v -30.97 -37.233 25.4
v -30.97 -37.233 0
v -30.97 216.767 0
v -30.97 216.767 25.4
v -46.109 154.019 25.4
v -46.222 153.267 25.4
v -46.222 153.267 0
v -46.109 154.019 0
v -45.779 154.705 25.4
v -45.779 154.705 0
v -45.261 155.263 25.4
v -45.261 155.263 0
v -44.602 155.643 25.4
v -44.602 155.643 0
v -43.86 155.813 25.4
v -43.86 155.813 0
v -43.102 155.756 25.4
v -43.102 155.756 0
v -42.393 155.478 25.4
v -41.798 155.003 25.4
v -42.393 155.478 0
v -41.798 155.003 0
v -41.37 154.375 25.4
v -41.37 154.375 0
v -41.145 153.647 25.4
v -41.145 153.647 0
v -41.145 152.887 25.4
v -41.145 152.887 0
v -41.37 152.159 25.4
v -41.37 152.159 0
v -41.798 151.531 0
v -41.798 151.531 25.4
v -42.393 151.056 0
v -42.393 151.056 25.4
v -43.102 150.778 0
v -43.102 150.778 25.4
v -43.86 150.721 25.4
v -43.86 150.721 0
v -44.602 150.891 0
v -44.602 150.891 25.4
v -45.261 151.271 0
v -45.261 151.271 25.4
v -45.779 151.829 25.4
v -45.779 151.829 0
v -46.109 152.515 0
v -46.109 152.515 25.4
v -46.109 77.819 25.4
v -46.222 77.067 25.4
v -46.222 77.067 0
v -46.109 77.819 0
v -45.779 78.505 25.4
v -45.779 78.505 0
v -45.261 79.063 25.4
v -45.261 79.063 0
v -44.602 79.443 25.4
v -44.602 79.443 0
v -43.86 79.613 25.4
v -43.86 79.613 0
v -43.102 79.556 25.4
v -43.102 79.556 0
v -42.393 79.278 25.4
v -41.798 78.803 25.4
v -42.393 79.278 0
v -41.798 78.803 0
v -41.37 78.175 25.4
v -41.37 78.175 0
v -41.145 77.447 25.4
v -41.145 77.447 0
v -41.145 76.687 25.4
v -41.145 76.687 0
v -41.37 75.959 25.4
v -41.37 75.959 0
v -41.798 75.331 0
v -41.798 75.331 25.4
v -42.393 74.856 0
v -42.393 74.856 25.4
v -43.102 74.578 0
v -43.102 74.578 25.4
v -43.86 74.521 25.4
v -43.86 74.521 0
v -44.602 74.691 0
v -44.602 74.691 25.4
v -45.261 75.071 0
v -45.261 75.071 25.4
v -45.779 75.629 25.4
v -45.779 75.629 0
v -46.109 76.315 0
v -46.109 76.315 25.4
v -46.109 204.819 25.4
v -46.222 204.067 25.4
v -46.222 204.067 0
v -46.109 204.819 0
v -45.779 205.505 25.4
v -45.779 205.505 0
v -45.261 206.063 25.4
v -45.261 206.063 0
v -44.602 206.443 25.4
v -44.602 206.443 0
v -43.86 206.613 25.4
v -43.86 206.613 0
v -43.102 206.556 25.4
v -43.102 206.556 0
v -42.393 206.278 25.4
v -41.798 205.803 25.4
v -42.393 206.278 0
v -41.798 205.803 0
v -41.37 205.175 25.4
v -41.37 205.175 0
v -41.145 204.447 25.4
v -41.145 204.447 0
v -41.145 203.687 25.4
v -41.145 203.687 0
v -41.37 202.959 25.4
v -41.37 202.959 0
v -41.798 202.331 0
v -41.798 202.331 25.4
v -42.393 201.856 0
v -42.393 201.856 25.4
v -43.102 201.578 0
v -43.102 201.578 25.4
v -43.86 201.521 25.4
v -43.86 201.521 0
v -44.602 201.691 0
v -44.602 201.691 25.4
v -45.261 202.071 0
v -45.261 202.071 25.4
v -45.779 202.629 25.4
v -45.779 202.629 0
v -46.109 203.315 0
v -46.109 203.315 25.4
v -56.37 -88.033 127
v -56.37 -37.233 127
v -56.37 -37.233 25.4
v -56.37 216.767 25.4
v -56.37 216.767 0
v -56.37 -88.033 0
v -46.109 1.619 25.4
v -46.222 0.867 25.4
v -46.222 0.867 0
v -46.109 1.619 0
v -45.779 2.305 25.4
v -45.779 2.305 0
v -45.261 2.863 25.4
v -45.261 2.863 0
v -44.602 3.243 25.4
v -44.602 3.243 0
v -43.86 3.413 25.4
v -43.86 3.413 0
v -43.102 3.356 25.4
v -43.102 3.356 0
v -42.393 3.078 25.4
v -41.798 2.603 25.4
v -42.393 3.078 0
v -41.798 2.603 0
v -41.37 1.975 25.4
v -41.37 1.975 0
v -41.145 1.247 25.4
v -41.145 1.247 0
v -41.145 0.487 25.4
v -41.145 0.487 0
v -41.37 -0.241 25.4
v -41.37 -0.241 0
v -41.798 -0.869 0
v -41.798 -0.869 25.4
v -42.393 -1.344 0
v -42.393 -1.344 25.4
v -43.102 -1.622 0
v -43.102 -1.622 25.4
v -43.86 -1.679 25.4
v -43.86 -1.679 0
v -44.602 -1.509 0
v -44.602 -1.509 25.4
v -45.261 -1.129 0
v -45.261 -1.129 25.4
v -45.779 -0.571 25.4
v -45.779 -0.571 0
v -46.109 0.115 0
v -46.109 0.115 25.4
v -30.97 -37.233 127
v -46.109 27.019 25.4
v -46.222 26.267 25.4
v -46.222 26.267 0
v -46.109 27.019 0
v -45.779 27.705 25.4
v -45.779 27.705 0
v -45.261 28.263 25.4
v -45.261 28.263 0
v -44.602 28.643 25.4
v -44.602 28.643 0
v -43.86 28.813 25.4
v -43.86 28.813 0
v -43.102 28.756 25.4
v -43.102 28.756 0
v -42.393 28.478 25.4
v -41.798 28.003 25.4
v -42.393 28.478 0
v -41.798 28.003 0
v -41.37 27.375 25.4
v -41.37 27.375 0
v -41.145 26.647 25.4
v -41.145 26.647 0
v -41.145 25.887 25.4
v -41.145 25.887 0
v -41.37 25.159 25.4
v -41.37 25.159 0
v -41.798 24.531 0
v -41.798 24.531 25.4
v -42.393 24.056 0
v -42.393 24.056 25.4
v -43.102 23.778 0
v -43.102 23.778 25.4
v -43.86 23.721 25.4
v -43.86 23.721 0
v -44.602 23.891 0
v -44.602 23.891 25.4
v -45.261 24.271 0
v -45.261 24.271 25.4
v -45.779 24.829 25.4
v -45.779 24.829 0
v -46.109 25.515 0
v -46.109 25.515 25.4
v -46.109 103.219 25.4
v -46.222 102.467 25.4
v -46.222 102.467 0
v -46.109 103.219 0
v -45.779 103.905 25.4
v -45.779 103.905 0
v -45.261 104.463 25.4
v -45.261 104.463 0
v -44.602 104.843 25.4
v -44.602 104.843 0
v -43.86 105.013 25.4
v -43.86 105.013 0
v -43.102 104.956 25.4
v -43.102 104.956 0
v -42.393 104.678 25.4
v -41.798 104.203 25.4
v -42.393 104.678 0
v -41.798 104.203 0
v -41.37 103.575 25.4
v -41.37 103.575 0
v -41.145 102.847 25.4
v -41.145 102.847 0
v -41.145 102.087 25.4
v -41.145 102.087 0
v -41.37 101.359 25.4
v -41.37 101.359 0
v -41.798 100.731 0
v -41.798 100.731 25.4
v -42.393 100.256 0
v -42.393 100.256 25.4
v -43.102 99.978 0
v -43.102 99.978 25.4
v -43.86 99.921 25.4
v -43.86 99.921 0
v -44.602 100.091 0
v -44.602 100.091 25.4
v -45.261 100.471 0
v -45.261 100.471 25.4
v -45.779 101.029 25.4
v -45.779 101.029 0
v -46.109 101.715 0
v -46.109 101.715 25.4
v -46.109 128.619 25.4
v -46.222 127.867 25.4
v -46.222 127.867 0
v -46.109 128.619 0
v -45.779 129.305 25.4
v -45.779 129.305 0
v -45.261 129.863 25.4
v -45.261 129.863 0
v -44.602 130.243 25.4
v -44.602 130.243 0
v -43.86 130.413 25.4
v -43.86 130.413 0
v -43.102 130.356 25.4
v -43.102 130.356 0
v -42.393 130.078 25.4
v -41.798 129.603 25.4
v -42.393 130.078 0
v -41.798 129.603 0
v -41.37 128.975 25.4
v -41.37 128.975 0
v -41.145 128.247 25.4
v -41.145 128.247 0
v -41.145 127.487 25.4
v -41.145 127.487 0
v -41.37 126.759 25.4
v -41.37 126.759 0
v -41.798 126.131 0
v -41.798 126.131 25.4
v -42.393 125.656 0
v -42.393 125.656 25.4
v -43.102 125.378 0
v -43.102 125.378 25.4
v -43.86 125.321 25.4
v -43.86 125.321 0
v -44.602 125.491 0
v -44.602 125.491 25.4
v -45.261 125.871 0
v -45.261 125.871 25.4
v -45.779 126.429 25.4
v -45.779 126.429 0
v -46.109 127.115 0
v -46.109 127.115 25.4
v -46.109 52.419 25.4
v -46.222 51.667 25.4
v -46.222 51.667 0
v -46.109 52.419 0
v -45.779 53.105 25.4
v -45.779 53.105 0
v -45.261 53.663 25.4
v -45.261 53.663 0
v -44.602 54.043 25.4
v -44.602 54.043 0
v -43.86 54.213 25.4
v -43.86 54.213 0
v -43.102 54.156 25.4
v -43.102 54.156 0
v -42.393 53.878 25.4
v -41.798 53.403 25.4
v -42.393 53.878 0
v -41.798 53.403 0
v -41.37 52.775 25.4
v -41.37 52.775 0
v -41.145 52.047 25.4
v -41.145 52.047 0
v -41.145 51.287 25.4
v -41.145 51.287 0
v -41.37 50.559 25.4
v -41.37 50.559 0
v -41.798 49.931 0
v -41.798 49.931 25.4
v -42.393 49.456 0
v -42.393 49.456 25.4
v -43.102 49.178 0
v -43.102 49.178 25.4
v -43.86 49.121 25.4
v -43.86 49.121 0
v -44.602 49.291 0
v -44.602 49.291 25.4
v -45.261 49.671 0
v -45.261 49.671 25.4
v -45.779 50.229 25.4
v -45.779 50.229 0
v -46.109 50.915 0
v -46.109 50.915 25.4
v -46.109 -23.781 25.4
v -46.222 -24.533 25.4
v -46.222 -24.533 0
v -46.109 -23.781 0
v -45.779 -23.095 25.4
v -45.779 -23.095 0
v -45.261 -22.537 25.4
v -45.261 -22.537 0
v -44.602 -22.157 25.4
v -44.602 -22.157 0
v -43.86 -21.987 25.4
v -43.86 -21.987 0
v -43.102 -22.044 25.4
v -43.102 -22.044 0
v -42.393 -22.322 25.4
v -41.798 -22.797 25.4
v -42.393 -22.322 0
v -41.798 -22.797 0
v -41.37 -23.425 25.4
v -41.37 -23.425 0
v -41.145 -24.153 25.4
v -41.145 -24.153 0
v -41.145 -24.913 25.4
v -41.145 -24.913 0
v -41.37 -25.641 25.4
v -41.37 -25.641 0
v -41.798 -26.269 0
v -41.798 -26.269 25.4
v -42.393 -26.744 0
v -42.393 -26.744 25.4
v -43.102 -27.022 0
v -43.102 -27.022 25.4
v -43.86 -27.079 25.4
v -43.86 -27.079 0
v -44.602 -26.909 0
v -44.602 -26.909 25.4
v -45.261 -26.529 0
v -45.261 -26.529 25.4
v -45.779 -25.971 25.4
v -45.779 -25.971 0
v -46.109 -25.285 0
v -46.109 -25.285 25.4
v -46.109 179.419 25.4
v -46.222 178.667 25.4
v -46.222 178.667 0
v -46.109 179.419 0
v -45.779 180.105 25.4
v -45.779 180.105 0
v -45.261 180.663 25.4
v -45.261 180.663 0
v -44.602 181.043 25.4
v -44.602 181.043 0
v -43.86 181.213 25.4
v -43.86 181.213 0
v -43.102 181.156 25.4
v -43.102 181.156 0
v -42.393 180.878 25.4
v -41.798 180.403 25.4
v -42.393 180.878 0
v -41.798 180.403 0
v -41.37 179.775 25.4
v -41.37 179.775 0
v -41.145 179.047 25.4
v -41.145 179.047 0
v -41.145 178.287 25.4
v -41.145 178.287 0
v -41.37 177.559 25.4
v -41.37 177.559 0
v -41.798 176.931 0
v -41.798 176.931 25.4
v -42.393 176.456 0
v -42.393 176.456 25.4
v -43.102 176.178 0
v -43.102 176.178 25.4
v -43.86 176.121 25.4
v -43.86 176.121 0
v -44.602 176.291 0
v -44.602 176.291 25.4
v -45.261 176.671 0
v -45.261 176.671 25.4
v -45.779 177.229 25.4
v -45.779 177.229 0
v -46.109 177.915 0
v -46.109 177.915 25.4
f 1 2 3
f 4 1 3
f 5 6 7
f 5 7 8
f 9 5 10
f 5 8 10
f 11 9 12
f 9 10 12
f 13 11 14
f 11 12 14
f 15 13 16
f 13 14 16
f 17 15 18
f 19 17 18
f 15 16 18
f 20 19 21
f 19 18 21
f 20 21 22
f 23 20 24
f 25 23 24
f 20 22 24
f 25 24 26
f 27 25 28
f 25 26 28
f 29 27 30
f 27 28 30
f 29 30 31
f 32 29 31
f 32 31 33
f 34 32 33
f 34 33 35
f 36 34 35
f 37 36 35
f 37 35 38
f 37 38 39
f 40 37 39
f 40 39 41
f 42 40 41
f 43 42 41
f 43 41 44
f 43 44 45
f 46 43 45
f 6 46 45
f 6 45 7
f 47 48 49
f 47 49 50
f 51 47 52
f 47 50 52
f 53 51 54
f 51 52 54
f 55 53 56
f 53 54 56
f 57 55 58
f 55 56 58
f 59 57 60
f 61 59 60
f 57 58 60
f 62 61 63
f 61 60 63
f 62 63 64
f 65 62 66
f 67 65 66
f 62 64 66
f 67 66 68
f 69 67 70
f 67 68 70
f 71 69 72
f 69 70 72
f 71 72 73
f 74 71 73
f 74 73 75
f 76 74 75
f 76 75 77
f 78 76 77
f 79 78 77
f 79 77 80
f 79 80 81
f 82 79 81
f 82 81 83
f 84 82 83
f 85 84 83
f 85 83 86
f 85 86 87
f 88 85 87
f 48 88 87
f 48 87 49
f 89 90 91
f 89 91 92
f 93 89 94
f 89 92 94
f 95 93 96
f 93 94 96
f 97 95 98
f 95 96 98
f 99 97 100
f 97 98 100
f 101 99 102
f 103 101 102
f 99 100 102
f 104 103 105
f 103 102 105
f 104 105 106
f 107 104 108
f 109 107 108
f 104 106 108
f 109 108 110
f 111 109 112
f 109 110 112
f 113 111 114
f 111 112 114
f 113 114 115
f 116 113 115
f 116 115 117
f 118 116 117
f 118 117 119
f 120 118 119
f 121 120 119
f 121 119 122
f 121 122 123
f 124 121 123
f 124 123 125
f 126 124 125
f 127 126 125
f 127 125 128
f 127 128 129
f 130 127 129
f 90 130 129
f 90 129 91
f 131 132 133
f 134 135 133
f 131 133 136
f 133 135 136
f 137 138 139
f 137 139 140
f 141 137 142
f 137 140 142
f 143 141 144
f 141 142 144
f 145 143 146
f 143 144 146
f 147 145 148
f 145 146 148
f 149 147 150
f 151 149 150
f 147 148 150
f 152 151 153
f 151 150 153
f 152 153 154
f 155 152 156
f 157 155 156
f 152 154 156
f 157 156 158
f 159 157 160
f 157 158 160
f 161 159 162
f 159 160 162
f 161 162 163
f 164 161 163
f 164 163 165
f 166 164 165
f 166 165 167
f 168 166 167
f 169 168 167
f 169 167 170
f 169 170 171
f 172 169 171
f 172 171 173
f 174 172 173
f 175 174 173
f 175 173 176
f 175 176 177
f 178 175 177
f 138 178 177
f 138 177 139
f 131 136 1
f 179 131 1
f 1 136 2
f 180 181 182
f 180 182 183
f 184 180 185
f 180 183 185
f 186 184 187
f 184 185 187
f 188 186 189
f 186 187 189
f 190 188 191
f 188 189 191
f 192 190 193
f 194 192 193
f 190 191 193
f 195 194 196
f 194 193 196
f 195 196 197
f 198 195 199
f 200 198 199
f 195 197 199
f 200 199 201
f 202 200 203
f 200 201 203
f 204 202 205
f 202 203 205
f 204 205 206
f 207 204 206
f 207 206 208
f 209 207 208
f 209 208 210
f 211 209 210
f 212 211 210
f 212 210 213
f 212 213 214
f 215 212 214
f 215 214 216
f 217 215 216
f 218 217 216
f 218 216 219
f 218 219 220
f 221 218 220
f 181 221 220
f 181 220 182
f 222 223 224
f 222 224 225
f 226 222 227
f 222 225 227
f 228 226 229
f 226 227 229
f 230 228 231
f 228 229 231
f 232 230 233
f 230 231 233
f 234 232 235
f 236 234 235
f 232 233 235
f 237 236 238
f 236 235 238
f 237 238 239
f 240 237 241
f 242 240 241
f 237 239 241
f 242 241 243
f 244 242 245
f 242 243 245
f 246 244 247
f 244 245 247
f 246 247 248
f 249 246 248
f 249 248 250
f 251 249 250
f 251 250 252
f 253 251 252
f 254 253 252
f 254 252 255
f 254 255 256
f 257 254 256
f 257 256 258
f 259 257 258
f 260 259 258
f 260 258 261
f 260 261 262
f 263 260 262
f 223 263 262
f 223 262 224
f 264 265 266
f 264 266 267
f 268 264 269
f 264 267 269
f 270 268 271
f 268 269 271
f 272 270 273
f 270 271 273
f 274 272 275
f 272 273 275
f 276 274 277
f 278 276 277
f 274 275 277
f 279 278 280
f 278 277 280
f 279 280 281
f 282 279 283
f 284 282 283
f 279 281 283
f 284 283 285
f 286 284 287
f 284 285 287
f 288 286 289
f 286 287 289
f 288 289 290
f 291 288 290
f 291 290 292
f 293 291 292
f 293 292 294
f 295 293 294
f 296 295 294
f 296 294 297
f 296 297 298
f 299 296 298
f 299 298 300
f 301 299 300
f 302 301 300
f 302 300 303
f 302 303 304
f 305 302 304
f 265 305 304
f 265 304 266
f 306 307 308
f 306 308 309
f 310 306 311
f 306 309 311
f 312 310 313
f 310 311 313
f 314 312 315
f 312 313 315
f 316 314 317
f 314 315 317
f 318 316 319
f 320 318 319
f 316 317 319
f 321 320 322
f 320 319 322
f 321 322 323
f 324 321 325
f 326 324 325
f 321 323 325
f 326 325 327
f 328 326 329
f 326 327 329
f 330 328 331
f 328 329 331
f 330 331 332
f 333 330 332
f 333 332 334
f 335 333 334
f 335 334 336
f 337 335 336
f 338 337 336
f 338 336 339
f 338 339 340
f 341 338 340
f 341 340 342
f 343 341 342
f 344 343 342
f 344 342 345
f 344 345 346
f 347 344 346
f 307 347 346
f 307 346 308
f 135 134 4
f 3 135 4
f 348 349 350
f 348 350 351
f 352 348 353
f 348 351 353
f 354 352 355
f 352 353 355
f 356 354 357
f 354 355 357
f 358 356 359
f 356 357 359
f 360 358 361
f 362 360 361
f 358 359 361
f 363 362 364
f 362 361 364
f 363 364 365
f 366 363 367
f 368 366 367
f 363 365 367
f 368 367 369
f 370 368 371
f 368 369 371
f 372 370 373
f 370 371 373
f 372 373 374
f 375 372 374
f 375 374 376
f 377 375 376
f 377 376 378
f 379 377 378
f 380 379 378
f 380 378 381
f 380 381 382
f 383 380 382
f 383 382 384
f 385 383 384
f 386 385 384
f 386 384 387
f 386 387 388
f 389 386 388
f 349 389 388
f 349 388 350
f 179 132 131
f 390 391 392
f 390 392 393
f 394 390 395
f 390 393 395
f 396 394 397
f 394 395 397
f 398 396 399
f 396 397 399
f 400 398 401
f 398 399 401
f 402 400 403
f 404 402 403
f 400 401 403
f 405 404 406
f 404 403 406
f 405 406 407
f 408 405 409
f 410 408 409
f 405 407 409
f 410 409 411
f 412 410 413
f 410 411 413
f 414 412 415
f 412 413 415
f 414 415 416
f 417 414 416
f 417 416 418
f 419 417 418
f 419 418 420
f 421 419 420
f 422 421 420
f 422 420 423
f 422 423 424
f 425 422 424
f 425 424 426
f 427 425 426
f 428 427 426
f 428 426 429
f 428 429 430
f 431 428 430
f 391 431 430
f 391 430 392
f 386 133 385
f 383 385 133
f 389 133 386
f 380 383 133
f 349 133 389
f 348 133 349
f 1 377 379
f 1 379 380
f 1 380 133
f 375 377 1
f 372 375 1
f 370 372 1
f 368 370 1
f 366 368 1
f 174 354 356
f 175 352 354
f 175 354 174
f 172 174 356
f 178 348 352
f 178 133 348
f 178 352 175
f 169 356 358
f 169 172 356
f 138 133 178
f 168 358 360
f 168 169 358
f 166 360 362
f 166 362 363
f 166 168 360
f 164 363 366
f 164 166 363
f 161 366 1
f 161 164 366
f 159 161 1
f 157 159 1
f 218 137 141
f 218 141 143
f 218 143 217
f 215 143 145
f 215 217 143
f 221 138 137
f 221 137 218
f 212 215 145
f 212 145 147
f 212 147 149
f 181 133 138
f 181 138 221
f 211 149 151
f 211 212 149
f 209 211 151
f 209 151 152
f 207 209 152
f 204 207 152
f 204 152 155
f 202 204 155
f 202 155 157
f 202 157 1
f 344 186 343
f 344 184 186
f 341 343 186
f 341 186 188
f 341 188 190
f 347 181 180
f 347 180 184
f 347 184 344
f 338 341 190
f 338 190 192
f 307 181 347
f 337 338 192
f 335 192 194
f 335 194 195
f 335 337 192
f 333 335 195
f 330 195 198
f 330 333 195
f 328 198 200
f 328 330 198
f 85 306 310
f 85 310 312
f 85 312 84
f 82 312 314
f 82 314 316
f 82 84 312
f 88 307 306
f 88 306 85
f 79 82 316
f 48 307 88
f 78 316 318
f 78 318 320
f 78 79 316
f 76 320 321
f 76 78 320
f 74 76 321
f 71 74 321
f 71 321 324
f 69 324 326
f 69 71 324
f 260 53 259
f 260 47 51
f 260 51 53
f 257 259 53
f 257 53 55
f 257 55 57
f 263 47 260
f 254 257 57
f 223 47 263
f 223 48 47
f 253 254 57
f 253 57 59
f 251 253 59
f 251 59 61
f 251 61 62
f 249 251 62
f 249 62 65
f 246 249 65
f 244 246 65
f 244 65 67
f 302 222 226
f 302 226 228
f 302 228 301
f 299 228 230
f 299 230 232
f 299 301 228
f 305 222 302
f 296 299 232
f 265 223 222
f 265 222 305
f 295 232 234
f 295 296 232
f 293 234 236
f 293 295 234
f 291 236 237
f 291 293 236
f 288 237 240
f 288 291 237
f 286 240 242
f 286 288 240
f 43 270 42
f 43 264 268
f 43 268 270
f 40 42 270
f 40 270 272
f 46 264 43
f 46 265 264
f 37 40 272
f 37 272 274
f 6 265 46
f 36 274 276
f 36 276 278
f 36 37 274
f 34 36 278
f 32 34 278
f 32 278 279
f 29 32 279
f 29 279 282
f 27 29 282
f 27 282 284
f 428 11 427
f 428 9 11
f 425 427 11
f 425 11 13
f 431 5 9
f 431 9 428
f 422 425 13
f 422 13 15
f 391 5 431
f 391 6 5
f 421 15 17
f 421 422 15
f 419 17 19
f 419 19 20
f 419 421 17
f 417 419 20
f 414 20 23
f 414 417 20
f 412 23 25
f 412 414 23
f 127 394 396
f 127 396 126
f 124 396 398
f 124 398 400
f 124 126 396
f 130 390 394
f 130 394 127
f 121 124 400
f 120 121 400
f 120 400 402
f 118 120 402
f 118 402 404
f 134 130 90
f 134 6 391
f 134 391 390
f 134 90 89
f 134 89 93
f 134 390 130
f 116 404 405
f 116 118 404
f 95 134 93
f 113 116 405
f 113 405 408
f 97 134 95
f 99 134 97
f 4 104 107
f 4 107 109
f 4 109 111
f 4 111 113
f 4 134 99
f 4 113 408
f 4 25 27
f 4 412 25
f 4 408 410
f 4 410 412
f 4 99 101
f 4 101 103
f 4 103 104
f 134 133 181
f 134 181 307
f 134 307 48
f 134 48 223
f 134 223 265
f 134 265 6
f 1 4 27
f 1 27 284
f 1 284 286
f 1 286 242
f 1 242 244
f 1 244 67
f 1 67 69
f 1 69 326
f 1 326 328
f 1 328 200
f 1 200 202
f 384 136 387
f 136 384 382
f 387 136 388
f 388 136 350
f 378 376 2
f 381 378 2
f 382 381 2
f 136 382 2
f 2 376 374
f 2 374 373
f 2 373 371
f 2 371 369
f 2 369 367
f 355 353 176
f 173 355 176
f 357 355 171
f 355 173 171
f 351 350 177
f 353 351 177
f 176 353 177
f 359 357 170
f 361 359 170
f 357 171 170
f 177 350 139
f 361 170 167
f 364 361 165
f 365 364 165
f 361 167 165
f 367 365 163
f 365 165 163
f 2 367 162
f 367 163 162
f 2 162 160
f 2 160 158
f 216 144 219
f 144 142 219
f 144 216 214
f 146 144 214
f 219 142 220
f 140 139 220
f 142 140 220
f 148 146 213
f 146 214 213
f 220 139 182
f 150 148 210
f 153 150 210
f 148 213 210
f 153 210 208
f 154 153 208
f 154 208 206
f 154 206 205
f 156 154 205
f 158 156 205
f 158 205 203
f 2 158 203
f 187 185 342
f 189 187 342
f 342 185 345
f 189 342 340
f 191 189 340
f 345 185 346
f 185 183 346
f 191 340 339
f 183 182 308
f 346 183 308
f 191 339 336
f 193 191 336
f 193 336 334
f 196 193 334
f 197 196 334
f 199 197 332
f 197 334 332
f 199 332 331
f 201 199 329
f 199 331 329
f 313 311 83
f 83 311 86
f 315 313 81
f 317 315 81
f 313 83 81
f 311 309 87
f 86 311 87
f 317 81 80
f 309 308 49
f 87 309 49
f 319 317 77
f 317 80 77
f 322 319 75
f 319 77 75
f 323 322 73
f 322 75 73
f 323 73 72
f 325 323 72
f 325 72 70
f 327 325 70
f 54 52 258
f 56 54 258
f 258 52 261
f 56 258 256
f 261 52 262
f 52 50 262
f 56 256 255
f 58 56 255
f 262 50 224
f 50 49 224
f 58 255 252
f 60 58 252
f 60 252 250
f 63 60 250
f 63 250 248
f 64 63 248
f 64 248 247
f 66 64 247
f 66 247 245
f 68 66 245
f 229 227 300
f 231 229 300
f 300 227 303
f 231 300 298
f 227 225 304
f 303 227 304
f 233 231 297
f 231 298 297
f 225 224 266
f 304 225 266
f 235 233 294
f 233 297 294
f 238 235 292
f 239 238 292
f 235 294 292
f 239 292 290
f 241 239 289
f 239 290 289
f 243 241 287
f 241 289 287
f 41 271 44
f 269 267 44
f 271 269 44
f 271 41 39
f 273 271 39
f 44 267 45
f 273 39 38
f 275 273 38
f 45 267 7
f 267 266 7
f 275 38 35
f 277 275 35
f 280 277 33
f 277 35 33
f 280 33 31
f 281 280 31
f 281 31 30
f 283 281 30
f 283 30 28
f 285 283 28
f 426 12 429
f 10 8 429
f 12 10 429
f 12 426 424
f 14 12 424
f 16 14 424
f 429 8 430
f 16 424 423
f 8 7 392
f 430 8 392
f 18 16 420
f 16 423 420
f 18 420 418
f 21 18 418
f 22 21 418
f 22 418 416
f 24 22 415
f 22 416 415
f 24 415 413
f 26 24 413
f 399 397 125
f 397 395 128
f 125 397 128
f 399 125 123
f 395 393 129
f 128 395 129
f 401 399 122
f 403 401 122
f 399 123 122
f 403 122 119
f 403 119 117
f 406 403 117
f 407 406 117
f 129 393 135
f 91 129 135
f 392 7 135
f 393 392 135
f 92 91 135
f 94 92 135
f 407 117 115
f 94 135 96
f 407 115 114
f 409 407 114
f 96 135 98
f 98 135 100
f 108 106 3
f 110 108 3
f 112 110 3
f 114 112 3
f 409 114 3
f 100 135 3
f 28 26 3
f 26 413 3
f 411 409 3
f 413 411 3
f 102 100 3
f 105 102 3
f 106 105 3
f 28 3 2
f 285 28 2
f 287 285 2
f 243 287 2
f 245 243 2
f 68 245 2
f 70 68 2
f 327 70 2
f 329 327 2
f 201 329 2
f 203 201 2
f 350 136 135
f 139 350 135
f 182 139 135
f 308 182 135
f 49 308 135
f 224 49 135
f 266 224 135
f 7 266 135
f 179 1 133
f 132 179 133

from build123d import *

# Parameters (mm, degrees)
F0_W     = 25.4
F0_H     = 254
F1_DEPTH = 25.4
F2_DEPTH = 127
F4_D     = 5.1054


with BuildPart() as f1:
    # F0 (on Top) → F1 (new body)
    with BuildSketch(Plane.XY):
        with Locations((-43.66958, 89.766972)):
            Rectangle(F0_W, F0_H)
    extrude(amount=F1_DEPTH)

    # F0 (on Top) → F2 (join)
    with BuildSketch(Plane.XY):
        Polygon((-30.96958, -37.233028), (-56.36958, -37.233028), (-56.36958, -88.033028), align=None)
    extrude(amount=F2_DEPTH)

    # F4 (through all)
    with Locations(Plane.XY.offset(25.4)):
        with Locations((-43.66958, 204.066972), (-43.66958, 153.266972), (-43.66958, 178.666972), (-43.66958, 127.866972), (-43.66958, 102.466972), (-43.66958, 77.066972), (-43.66958, 0.866972), (-43.66958, 51.666972), (-43.66958, 26.266972), (-43.66958, -24.533028)):
            Hole(F4_D / 2)


solid = f1.part
